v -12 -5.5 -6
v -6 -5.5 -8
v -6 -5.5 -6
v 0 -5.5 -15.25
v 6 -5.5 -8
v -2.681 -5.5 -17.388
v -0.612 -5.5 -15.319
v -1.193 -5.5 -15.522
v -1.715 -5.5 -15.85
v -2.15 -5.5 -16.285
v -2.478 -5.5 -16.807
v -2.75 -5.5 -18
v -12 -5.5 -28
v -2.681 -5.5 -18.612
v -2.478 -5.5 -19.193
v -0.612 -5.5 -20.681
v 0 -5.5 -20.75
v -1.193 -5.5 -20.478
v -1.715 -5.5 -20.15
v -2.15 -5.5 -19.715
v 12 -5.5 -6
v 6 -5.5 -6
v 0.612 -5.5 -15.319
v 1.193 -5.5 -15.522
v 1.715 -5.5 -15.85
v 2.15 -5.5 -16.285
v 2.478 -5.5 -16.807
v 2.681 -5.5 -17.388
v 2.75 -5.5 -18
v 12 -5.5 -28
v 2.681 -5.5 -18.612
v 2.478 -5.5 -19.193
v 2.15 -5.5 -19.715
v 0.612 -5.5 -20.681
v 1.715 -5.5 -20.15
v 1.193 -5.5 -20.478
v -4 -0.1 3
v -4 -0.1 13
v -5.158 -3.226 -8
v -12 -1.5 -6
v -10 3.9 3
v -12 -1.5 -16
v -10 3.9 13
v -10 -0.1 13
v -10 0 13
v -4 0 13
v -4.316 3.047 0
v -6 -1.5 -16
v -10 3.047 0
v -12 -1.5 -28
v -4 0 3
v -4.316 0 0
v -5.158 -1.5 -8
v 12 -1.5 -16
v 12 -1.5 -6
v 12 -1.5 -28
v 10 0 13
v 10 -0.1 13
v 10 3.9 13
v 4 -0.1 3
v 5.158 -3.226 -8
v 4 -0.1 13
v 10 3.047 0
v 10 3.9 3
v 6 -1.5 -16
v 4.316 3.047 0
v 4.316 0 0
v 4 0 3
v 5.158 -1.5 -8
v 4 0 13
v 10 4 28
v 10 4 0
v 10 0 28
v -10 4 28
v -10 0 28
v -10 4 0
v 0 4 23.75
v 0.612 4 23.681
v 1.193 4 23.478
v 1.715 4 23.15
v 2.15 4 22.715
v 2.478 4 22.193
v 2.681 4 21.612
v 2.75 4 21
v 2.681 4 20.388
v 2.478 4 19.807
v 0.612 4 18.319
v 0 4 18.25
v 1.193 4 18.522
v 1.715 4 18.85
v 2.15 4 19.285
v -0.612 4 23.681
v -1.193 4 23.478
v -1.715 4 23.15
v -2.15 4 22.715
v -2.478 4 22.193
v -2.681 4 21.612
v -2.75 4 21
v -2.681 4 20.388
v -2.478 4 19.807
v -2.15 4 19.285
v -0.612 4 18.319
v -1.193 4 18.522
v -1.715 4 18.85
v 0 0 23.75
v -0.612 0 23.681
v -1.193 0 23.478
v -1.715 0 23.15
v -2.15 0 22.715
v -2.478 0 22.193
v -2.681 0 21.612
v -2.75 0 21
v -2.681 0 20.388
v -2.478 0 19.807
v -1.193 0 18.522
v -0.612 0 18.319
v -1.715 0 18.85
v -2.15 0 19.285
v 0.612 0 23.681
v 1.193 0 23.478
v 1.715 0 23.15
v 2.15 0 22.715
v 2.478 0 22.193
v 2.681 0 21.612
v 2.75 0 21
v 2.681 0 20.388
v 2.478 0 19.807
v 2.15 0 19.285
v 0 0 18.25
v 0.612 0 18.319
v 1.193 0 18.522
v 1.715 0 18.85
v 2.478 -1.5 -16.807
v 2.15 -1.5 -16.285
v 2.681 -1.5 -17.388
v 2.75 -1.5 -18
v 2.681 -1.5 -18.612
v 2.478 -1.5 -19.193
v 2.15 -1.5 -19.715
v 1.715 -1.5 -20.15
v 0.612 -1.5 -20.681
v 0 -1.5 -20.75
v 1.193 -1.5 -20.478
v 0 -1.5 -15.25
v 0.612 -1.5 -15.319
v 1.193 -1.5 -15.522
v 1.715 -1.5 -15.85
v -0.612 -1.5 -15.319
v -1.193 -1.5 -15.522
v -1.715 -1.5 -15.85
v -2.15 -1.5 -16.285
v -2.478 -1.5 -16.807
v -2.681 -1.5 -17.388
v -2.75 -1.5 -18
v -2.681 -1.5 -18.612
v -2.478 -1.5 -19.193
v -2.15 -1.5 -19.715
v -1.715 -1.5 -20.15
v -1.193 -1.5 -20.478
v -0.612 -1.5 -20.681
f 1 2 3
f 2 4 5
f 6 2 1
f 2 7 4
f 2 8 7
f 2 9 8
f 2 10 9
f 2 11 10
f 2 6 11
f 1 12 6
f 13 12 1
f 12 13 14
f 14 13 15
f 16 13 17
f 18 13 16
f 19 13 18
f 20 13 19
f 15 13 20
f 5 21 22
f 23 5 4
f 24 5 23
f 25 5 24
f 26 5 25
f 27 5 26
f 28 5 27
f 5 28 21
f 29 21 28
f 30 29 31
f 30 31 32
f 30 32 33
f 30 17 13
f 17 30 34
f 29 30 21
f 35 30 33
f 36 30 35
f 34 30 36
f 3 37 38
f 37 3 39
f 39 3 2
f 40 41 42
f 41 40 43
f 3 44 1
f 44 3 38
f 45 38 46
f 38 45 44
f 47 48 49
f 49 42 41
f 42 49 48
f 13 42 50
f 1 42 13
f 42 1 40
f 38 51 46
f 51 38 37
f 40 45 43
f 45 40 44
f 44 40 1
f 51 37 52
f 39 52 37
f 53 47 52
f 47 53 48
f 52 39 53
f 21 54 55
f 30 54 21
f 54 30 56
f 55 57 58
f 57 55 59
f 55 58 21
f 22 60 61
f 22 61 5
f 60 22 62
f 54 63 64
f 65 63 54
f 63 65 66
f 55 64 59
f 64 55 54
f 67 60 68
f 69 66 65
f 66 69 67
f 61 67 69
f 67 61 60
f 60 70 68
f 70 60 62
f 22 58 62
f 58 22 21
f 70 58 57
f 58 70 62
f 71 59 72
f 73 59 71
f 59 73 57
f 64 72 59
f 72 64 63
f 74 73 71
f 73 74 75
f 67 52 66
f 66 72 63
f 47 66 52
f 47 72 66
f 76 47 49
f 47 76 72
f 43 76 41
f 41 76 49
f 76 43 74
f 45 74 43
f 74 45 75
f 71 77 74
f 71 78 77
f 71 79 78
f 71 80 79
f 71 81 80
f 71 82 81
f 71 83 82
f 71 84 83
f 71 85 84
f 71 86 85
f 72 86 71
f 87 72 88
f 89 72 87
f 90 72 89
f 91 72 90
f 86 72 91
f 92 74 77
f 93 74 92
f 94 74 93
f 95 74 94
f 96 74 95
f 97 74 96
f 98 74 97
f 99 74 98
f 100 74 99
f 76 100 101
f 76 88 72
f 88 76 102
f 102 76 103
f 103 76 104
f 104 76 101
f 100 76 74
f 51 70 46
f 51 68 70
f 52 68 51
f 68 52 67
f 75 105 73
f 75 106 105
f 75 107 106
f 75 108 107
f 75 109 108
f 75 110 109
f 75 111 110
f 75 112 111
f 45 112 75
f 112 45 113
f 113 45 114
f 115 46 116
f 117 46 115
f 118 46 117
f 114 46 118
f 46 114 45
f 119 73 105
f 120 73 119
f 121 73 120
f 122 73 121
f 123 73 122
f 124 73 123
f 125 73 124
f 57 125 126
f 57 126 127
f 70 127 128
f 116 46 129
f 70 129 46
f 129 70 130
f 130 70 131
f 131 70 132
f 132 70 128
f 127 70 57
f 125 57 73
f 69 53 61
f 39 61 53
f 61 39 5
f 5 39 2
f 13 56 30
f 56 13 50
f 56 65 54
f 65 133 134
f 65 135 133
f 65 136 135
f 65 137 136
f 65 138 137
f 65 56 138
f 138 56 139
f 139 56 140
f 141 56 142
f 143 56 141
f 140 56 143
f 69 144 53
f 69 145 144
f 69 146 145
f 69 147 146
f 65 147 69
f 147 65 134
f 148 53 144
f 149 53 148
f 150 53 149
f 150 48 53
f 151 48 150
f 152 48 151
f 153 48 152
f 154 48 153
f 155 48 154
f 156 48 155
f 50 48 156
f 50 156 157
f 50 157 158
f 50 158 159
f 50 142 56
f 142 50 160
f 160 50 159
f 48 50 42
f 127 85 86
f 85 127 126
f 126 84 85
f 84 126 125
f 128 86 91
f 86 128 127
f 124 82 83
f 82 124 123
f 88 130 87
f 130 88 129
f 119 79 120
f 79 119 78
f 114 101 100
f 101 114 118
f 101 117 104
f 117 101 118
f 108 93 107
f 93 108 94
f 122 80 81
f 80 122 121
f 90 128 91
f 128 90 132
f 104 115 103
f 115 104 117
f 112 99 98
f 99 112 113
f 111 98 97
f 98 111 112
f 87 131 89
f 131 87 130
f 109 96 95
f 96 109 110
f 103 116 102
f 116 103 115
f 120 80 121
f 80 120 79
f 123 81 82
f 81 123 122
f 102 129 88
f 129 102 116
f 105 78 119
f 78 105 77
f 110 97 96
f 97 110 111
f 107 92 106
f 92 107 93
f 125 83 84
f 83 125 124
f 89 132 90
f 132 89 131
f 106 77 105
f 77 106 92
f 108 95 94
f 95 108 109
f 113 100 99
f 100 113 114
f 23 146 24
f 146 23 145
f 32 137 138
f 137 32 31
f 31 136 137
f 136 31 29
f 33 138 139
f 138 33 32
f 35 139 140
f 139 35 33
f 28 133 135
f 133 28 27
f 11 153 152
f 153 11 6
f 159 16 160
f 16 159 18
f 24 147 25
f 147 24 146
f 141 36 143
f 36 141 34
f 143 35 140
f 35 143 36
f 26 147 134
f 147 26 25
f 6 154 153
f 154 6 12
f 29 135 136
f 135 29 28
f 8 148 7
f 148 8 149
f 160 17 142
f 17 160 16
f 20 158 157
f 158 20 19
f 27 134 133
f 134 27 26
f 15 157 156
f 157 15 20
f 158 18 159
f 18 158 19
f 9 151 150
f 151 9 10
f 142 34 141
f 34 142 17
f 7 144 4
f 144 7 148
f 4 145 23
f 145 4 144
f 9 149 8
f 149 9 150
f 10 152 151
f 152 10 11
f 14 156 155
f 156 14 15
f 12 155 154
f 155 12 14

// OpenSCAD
// HUB75 display case component: power_supply_bottom_bracket
include <../config/project_config.scad>

module power_supply_bottom_bracket() {
    // Straight two-point bracket:
    // top against the metal plate, bottom with a solid clamping face
    // against the rear of the 2020 extrusion.
    plate_flange_h = 28;
    extrusion_clamp_width = 24;
    extrusion_clamp_height = 20;
    extrusion_center_local_z = extrusion_size/2 - power_supply_plate_bottom_z;
    extrusion_y = frame_back_y - (din_front_y + 2 + power_supply_plate_thickness);
    arm_width = 6;

    color(color_bracket)
    difference() {
        union() {
            // Upper flange against the metal plate.
            translate([
                -power_supply_bottom_bracket_width/2,
                0,
                0
            ])
                cube([
                    power_supply_bottom_bracket_width,
                    power_supply_bottom_bracket_thickness,
                    plate_flange_h
                ]);

            // Solid clamping face against the rear of the extrusion.
            // At least approximately 7 mm of material remains around the M5 hole.
            translate([
                -extrusion_clamp_width/2,
                extrusion_y,
                extrusion_center_local_z-extrusion_clamp_height/2
            ])
                cube([
                    extrusion_clamp_width,
                    power_supply_bottom_bracket_thickness,
                    extrusion_clamp_height
                ]);

            // Two straight connecting arms between the plate flange and clamping face.
            for(sx=[-1,1])
                hull() {
                    translate([
                        sx < 0
                            ? -power_supply_bottom_bracket_width/2
                            : power_supply_bottom_bracket_width/2-arm_width,
                        -0.1,
                        3
                    ])
                        cube([
                            arm_width,
                            power_supply_bottom_bracket_thickness,
                            10
                        ]);

                    translate([
                        sx < 0
                            ? -extrusion_clamp_width/2
                            : extrusion_clamp_width/2-arm_width,
                        extrusion_y,
                        extrusion_center_local_z+2
                    ])
                        cube([
                            arm_width,
                            power_supply_bottom_bracket_thickness,
                            10
                        ]);
                }
        }

        // Upper M5 bolt, high in the plate flange.
        translate([0,-1,21])
            rotate([-90,0,0])
                cylinder(
                    h=power_supply_bottom_bracket_thickness+3,
                    d=5.5,
                    $fn=28
                );

        // Lower M5 bolt through the solid clamping face
        // to the T-nut in the rear extrusion slot.
        translate([
            0,
            extrusion_y-1,
            extrusion_center_local_z
        ])
            rotate([-90,0,0])
                cylinder(
                    h=power_supply_bottom_bracket_thickness+3,
                    d=5.5,
                    $fn=28
                );
    }
}

/* [Standalone preview] */
power_supply_bottom_bracket();
